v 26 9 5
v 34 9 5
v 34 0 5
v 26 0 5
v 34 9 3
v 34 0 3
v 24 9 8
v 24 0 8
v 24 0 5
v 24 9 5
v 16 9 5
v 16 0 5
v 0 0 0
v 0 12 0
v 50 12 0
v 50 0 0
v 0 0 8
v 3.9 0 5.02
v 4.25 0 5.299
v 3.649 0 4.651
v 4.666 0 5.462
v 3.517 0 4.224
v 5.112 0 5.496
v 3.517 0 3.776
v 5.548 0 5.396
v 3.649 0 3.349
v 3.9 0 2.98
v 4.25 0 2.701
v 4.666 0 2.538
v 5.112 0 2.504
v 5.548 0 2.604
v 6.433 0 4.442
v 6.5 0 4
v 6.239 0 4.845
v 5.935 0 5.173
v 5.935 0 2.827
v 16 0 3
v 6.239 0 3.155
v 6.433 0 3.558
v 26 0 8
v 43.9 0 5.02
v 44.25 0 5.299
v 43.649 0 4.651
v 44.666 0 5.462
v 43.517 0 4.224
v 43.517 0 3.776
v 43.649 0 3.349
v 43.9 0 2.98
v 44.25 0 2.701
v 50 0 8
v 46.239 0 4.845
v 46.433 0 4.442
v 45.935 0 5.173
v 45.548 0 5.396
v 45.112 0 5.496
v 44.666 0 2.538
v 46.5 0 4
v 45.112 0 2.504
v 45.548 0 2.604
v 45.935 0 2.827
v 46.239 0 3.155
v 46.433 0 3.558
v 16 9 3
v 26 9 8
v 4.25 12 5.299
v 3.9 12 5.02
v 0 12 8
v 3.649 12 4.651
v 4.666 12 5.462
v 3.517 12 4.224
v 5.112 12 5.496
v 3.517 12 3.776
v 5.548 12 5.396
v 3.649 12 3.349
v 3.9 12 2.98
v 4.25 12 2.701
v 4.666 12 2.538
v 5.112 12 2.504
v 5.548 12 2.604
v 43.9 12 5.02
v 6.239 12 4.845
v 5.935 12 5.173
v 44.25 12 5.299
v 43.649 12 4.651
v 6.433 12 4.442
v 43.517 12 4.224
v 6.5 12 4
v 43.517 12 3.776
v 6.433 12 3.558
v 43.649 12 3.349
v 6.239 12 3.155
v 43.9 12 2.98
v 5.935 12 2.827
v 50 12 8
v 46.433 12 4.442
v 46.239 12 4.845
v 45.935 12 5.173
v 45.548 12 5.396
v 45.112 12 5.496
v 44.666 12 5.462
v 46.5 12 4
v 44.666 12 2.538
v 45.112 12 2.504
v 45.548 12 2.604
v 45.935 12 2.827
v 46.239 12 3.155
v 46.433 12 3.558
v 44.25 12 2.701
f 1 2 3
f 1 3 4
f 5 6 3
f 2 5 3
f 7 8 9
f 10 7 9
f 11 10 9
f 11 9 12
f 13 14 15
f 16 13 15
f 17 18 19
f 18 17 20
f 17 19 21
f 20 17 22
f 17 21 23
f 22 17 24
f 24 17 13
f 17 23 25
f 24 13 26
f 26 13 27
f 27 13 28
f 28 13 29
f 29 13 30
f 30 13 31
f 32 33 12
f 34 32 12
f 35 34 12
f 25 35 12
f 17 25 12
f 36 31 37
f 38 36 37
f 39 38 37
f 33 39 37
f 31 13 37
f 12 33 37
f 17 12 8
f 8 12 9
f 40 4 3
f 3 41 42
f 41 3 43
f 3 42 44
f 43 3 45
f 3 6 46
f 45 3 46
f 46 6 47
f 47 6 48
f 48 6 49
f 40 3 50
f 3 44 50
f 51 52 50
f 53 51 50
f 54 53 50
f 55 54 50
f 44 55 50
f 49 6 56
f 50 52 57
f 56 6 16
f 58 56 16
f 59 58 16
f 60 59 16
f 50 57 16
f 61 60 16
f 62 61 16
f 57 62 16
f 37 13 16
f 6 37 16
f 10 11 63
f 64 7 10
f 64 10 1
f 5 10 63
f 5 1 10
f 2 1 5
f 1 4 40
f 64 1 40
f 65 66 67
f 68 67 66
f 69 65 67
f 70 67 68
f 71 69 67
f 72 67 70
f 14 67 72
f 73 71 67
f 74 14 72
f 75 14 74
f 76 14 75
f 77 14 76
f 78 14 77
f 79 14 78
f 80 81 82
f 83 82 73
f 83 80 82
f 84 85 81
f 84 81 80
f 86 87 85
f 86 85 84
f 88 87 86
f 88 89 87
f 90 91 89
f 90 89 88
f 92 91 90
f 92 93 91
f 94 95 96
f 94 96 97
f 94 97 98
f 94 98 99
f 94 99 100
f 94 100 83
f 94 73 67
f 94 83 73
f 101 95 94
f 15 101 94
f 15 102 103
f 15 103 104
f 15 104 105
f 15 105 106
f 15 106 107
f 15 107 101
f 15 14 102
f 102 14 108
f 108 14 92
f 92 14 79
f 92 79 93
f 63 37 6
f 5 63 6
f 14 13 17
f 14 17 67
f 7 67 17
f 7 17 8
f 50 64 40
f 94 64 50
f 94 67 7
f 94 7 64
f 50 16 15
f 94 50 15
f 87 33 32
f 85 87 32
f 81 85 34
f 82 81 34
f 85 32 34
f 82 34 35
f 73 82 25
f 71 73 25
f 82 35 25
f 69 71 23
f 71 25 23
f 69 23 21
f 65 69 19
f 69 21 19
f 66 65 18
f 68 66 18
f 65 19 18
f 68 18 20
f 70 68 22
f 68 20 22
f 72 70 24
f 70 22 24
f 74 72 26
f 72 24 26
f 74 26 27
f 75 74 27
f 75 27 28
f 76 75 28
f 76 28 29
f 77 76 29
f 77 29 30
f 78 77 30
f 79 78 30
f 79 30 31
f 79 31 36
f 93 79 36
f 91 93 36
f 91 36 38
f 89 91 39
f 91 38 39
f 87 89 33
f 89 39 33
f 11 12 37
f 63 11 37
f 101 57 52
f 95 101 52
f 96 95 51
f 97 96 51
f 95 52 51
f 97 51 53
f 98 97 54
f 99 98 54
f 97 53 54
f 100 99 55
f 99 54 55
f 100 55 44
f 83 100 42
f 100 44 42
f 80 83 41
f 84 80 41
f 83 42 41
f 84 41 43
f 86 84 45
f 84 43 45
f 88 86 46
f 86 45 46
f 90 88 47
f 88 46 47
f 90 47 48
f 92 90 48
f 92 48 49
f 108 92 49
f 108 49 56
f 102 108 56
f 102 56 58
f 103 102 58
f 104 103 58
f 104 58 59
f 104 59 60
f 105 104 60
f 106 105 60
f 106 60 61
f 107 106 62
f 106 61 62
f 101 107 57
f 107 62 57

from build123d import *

# Parameters (mm, degrees)
F0_W     = 50
F0_H     = 12
F1_DEPTH = 8
F2_R     = 1.5
F3_DEPTH = 12
F4_DEPTH = 9


with BuildPart() as f1:
    # F0 (on Top) → F1 (new body)
    with BuildSketch(Plane.XY):
        with Locations((25, 6)):
            Rectangle(F0_W, F0_H)
    extrude(amount=F1_DEPTH)

    # F2 (on face) → F3 (cut)
    with BuildSketch(Plane.XZ):
        with Locations((5, 4)):
            Circle(F2_R)
        with Locations((45, 4)):
            Circle(F2_R)
    extrude(amount=-F3_DEPTH, mode=Mode.SUBTRACT)

    # F2 (on face) → F4 (cut)
    with BuildSketch(Plane.XZ):
        Polygon((26, 8), (24, 8), (24, 5), (16, 5), (16, 3), (34, 3), (34, 5), (26, 5), align=None)
    extrude(amount=-F4_DEPTH, mode=Mode.SUBTRACT)


solid = f1.part
